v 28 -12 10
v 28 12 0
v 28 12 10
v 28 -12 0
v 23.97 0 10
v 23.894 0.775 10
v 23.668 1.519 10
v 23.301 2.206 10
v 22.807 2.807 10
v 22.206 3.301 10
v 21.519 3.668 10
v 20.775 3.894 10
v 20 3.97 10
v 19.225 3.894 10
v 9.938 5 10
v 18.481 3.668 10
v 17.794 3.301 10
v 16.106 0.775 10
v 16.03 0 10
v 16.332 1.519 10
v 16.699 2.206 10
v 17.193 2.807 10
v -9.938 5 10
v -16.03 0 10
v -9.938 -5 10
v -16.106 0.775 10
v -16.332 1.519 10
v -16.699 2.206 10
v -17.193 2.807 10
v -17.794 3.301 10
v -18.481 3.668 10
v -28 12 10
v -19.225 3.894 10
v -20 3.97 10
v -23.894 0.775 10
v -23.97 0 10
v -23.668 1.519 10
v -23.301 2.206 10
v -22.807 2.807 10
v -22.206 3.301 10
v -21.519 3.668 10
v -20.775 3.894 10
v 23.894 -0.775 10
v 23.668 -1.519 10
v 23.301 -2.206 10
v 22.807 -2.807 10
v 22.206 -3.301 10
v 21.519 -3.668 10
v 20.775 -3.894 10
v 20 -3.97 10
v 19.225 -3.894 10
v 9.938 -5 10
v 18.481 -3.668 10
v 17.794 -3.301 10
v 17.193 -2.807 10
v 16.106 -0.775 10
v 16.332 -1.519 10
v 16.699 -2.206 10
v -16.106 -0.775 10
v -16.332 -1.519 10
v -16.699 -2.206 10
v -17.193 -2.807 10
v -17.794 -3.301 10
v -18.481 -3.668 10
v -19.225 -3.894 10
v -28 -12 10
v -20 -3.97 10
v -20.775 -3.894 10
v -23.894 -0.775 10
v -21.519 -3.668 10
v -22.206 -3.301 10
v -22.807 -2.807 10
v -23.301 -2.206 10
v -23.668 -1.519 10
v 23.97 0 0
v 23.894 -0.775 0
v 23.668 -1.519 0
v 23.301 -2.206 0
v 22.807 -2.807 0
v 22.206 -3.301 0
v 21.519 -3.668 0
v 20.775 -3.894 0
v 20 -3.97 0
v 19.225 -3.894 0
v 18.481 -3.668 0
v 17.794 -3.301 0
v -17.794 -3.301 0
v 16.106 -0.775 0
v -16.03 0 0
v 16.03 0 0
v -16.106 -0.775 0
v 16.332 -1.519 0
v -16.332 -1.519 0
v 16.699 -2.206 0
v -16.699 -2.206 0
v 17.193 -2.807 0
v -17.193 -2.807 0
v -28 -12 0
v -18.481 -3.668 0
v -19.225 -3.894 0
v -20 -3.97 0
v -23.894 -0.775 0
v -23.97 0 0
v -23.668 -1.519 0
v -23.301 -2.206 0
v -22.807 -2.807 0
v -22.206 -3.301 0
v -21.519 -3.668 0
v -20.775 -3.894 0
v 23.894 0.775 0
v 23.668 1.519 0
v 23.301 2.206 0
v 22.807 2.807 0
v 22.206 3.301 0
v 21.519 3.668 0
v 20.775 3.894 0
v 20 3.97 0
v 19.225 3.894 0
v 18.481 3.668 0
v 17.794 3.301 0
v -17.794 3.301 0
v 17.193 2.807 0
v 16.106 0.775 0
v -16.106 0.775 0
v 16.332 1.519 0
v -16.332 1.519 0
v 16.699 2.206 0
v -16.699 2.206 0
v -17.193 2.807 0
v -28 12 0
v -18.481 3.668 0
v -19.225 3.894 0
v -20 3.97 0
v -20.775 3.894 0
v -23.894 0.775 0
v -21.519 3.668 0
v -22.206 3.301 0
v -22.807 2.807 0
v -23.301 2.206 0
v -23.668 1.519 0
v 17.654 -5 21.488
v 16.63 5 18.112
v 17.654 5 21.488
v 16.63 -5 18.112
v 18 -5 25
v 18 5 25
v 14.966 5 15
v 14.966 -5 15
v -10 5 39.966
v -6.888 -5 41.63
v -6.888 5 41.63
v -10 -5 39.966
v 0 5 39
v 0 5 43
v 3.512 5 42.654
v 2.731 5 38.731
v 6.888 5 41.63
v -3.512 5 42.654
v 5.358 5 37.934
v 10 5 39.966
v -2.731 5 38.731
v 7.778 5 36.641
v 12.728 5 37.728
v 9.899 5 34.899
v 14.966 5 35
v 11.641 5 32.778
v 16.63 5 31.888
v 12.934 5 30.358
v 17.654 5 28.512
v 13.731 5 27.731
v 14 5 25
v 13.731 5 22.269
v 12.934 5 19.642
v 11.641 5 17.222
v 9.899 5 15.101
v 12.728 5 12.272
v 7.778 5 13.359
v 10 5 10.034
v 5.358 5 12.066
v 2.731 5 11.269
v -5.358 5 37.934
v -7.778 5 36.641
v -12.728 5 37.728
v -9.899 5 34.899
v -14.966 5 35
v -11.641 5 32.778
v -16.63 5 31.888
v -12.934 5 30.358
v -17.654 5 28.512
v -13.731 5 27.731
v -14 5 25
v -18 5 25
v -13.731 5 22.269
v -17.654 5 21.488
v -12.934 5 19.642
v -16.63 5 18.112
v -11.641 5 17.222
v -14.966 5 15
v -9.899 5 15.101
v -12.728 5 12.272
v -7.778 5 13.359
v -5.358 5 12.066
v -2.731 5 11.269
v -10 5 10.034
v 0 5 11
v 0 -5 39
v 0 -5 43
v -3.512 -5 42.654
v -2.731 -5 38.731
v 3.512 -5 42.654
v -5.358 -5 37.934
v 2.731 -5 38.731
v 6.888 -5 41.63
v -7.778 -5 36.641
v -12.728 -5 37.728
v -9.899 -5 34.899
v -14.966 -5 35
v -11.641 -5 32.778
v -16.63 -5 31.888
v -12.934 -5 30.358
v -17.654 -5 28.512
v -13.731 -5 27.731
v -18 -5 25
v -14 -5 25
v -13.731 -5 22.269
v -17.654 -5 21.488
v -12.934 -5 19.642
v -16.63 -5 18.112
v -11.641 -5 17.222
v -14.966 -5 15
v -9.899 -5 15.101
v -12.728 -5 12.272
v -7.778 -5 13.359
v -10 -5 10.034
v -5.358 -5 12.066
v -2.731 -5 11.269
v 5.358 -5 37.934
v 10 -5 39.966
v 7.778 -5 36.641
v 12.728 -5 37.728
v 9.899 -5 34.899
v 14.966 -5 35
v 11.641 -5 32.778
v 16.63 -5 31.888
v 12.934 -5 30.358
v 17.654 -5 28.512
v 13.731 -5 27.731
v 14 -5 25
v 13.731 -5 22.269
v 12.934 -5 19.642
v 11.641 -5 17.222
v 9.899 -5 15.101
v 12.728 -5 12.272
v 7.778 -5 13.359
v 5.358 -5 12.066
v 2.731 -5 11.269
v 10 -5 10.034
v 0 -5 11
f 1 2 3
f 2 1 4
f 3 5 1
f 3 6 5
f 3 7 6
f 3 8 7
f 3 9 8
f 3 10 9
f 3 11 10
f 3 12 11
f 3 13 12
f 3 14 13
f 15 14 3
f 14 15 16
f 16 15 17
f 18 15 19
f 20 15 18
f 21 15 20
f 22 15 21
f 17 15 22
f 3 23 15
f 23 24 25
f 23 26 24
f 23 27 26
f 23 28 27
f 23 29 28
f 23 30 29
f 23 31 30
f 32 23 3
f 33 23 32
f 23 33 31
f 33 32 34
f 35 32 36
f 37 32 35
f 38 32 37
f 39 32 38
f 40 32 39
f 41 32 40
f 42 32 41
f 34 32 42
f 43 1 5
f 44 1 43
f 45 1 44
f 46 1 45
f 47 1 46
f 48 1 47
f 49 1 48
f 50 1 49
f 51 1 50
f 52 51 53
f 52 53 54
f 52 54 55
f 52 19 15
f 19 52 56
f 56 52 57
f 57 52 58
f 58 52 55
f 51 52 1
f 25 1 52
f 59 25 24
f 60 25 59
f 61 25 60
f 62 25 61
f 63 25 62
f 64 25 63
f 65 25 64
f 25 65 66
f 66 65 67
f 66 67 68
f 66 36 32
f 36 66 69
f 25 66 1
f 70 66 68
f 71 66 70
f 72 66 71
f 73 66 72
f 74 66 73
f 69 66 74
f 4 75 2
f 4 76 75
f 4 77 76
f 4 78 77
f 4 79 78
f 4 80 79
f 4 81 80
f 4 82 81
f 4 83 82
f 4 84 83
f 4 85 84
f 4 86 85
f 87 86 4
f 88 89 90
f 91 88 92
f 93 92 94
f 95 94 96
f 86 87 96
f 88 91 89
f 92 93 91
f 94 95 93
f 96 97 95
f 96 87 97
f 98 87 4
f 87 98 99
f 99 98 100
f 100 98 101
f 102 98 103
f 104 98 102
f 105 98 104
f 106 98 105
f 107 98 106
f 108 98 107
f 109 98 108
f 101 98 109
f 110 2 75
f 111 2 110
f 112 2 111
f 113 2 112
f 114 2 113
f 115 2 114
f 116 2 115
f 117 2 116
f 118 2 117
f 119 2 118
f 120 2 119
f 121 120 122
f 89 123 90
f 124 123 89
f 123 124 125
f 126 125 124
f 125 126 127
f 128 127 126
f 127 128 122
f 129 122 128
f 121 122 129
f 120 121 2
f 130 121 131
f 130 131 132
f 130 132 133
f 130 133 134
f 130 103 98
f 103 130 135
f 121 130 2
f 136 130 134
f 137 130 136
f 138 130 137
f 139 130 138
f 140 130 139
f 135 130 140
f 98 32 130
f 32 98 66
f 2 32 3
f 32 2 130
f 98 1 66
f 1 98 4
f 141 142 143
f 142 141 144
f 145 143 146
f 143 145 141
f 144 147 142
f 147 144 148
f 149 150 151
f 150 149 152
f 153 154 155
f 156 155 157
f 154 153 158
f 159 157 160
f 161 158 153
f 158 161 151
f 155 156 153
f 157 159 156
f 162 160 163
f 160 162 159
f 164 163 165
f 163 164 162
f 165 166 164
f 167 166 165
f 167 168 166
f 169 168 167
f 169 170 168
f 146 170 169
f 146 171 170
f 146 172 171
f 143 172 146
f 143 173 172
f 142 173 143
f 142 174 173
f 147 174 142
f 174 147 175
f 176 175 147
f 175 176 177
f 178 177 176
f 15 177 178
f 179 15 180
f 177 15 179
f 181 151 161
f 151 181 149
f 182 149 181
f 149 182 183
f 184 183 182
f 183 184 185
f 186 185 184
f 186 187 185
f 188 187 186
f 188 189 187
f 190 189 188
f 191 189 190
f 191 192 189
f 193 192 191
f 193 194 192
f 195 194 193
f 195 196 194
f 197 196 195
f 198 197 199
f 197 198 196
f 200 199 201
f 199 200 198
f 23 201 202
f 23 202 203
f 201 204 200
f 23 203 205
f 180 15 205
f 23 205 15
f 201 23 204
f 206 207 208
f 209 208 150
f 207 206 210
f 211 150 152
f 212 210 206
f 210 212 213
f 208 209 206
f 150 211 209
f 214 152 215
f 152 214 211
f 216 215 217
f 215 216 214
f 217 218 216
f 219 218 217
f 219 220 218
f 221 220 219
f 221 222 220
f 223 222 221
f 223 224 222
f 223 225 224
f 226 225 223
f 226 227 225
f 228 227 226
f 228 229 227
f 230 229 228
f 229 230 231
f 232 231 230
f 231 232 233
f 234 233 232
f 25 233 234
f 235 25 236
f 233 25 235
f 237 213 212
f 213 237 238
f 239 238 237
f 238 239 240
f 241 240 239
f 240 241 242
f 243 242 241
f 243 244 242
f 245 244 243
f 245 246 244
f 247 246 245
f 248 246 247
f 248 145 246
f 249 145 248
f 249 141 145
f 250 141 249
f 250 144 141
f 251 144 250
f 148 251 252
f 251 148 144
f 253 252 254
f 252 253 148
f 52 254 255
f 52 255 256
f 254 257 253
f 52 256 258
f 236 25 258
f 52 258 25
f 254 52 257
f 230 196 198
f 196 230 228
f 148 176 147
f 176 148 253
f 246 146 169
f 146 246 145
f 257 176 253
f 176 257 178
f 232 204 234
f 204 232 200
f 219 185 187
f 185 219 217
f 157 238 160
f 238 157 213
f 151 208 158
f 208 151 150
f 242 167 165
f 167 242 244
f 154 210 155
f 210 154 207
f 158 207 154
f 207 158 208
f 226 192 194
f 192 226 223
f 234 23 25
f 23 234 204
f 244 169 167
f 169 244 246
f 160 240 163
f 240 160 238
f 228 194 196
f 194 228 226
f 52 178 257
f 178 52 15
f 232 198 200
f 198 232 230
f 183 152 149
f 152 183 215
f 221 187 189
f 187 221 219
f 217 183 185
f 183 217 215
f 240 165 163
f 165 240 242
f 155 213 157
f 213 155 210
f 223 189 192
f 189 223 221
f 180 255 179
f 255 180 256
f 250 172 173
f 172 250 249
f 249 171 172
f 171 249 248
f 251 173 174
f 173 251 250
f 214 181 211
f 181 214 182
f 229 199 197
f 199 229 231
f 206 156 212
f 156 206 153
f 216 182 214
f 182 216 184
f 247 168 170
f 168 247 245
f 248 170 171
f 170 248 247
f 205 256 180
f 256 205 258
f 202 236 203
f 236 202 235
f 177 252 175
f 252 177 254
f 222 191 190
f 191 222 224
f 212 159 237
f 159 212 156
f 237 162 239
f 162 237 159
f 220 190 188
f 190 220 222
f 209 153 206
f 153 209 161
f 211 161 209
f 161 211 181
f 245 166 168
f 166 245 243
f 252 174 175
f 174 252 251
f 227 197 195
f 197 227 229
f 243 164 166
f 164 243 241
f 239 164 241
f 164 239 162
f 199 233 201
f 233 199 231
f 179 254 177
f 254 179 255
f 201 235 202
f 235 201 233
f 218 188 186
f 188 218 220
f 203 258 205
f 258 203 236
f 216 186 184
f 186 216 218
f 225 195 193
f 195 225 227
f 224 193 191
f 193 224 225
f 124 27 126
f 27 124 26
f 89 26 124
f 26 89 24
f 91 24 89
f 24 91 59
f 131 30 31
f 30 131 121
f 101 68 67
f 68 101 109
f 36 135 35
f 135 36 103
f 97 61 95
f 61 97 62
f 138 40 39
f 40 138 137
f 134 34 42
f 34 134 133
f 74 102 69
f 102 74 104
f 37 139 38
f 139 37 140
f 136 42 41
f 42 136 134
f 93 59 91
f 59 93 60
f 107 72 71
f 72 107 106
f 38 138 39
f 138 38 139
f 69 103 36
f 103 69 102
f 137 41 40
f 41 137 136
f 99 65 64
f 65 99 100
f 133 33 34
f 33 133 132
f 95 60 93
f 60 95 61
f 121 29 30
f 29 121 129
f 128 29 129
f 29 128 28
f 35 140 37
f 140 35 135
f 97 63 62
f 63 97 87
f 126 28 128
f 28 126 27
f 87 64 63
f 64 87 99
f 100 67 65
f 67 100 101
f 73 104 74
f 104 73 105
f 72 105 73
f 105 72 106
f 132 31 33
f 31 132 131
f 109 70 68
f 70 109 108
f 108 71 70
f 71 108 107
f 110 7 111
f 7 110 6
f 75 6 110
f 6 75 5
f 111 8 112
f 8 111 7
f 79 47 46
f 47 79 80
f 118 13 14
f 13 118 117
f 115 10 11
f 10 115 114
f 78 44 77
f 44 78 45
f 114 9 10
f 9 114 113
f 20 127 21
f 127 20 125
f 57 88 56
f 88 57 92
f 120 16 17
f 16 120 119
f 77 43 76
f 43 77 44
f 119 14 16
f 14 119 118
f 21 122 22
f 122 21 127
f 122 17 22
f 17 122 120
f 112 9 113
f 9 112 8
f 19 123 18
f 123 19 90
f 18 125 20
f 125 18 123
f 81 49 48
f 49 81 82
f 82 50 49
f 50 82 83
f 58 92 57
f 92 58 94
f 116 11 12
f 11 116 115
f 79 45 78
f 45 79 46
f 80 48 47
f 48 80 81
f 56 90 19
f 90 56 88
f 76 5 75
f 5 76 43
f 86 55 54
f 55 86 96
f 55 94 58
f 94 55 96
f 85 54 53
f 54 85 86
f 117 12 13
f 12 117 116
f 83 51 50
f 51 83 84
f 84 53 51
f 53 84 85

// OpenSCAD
$fn = 32;

// ----------------------------------------------------------------------
// Deck eye: 36 mm eye on a 56 mm base
// ----------------------------------------------------------------------

// --- parameters (mm) ---
base_l = 56;              // base length
base_w = 24;              // base width
base_t = 10;              // base thickness
eye_r = 18;               // eye outside radius
eye_bore = 28;            // eye bore diameter
eye_w = 10;               // eye thickness
eye_z = 25;               // eye centre height
holes_d = 7.94;           // fixing holes
hole_x = 20;              // fixing hole spacing

difference() {
  union() {
    translate([-28, -12, 0]) cube([base_l, base_w, base_t]);
    /* eye standing upright, its foot sunk 3 mm into the base */
    translate([0, -5, 25]) rotate([-90, 0, 0]) cylinder(h = 10, d = 36);
  }
  /* eye bore, 2.5 mm clear of both faces */
  translate([0, -7.5, 25]) rotate([-90, 0, 0]) cylinder(h = 15, d = 28);
  translate([-20, 0, -2.5]) cylinder(h = base_t + 5, d = holes_d);
  translate([20, 0, -2.5]) cylinder(h = base_t + 5, d = holes_d);
}
